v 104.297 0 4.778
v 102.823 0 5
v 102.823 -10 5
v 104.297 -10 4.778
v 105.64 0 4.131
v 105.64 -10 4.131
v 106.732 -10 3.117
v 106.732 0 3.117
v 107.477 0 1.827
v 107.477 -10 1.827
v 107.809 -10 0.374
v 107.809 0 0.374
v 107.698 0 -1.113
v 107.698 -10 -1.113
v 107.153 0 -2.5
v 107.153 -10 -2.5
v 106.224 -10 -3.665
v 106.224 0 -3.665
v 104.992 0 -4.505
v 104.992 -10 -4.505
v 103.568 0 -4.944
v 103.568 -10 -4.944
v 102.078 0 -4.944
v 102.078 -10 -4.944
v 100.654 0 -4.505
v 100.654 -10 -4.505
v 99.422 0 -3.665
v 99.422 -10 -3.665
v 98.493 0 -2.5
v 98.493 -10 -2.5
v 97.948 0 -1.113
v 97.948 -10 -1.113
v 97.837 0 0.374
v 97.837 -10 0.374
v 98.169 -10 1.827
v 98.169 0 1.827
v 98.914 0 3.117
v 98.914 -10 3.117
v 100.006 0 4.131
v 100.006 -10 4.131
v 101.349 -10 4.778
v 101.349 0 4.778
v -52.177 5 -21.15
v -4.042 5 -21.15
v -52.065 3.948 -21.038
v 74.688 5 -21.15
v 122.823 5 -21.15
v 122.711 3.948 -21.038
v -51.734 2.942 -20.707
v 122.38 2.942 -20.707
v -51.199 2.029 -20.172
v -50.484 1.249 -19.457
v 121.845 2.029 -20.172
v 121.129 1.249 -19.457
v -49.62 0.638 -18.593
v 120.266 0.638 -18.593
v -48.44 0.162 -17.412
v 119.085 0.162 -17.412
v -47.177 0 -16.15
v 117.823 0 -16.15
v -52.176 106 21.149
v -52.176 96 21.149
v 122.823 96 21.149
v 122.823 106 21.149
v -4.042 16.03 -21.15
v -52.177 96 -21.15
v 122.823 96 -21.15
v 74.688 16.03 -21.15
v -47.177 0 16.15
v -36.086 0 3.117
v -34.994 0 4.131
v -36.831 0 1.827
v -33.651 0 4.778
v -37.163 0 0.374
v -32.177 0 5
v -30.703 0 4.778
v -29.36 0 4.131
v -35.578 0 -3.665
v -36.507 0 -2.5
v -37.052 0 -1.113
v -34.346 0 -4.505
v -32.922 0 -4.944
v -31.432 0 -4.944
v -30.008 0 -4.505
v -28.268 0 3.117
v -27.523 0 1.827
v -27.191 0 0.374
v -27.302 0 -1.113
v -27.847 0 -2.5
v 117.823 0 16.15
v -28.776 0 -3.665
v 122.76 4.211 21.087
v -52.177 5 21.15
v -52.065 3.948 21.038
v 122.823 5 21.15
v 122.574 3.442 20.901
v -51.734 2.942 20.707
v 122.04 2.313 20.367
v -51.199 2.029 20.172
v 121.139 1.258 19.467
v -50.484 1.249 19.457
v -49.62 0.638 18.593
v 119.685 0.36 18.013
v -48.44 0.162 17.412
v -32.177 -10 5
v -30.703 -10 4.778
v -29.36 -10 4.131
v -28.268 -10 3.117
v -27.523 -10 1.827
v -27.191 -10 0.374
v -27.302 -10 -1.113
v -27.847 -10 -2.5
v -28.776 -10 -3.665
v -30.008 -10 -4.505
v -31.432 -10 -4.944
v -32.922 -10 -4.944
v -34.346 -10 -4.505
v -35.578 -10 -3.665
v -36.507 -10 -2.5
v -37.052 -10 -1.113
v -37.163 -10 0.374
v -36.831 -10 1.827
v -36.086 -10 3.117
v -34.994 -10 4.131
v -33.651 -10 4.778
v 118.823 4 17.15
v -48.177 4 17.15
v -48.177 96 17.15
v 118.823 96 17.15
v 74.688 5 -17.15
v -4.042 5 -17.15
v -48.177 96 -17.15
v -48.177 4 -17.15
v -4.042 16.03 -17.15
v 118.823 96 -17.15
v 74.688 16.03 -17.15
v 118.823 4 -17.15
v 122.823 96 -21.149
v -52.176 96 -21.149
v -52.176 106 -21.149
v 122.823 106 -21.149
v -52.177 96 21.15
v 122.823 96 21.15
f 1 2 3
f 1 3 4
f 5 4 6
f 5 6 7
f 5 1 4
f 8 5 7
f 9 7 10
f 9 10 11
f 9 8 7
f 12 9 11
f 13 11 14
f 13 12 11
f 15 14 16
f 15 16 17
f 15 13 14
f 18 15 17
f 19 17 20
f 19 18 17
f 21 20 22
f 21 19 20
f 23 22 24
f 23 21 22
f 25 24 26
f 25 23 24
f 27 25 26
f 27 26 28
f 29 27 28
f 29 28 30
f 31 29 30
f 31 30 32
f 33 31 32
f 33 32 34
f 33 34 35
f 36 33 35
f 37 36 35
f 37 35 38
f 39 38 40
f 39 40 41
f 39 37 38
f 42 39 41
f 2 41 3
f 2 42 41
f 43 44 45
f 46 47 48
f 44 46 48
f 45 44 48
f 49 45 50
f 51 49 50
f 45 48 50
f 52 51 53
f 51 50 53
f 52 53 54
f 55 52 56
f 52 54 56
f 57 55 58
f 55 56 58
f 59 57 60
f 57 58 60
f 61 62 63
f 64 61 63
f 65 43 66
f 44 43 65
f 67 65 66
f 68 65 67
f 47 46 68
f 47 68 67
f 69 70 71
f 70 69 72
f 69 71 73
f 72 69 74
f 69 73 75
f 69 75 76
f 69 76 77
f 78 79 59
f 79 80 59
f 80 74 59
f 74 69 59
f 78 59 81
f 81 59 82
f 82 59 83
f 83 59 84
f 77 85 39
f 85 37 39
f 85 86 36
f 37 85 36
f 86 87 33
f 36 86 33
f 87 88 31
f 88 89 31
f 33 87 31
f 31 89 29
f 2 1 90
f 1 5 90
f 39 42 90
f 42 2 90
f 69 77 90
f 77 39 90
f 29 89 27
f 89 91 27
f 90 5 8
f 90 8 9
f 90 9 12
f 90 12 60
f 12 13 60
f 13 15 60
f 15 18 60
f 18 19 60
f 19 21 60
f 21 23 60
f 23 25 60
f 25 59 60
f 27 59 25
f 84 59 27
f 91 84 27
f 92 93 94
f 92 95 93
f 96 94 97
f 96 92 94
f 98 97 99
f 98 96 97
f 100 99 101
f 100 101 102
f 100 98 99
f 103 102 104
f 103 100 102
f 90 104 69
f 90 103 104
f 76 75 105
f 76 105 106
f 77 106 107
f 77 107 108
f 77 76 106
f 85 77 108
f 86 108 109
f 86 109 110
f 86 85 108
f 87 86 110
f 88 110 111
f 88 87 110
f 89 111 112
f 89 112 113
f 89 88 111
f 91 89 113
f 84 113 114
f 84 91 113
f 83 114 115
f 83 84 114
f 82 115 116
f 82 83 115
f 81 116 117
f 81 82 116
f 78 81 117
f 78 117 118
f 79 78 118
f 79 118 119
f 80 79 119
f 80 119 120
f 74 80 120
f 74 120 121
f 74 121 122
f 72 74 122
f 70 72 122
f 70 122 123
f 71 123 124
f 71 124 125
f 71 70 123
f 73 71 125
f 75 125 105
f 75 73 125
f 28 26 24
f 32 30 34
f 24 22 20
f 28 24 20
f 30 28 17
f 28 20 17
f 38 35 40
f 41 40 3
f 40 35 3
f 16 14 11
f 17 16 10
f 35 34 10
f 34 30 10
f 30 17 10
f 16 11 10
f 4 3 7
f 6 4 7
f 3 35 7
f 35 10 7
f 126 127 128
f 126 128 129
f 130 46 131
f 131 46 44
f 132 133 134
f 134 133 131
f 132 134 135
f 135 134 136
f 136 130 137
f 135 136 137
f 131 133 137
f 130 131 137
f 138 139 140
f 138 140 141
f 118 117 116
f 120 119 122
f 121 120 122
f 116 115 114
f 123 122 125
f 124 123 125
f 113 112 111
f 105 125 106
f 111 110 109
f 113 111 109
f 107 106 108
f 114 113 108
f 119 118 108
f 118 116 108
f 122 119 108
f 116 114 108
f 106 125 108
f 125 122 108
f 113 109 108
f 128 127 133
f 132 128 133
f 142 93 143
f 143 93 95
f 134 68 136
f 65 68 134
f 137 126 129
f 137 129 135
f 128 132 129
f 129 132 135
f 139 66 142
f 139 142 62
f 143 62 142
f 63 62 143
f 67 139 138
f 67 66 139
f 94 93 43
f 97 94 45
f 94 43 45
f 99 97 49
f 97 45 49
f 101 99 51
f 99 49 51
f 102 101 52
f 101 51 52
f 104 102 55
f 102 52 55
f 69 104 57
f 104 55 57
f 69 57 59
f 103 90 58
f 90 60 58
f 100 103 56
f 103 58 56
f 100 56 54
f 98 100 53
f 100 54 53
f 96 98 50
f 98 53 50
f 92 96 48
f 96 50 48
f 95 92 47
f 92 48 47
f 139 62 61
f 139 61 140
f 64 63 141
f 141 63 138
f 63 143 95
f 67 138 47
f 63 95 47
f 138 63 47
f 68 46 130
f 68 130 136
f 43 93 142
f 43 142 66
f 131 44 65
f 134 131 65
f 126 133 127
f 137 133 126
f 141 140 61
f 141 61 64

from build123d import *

# Parameters (mm, degrees)
SKETCH1_W           = 175
SKETCH1_H           = 42.3
BOSS_EXTRUDE1_DEPTH = 4
SKETCH1_3_W         = 175
SKETCH1_3_H         = 42.3
SKETCH1_3_W_2       = 167
SKETCH1_3_H_2       = 34.3
BOSS_EXTRUDE2_DEPTH = 96
SKETCH1_4_R         = 5
BOSS_EXTRUDE3_DEPTH = 10
FILLET1_R           = 5
SKETCH3_W           = 78.73
SKETCH3_H           = 11.03
CUT_EXTRUDE1_DEPTH  = 4
SKETCH4_W           = 174.998654926
SKETCH4_H           = 42.297309852
BOSS_EXTRUDE4_DEPTH = 10


with BuildPart() as part:
    # Sketch1 → Boss-Extrude1 (new body)
    with BuildSketch(Plane(origin=(0, 0, 0), x_dir=(1, 0, 0), z_dir=(0, 1, 0))):
        with Locations((35.322931561, 0)):
            Rectangle(SKETCH1_W, SKETCH1_H)
    extrude(amount=BOSS_EXTRUDE1_DEPTH)

    # Sketch1<3> → Boss-Extrude2 (add)
    with BuildSketch(Plane(origin=(0, 0, 0), x_dir=(1, 0, 0), z_dir=(0, 1, 0))):
        with Locations((35.322931561, 0)):
            Rectangle(SKETCH1_3_W, SKETCH1_3_H)
        with Locations((35.322931561, 0)):
            Rectangle(SKETCH1_3_W_2, SKETCH1_3_H_2, mode=Mode.SUBTRACT)
    extrude(amount=BOSS_EXTRUDE2_DEPTH)

    # Sketch1<4> → Boss-Extrude3 (add)
    with BuildSketch(Plane(origin=(0, 0, 0), x_dir=(1, 0, 0), z_dir=(0, 1, 0))):
        with Locations((-32.177068439, 0)):
            Circle(SKETCH1_4_R)
        with Locations((102.822931561, 0)):
            Circle(SKETCH1_4_R)
    extrude(amount=-BOSS_EXTRUDE3_DEPTH)

    # Fillet1
    fillet1_edges = [part.edges().sort_by_distance(p)[0] for p in [
        (35.322931561, 0, 21.15),
        (-52.177068439, 0, 0),
        (35.322931561, 0, -21.15),
        (122.822931561, 0, 0),
    ]]
    fillet(fillet1_edges, radius=FILLET1_R)

    # Sketch3 → Cut-Extrude1 (cut)
    with BuildSketch(Plane(origin=(0, 0, -21.15), x_dir=(-1, 0, 0), z_dir=(0, 0, -1))):
        with Locations((-35.322931561, 10.515)):
            Rectangle(SKETCH3_W, SKETCH3_H)
    extrude(amount=-CUT_EXTRUDE1_DEPTH, mode=Mode.SUBTRACT)

    # Sketch4 → Boss-Extrude4 (add)
    with BuildSketch(Plane(origin=(0, 96, 0), x_dir=(1, 0, 0), z_dir=(0, 1, 0))):
        with Locations((35.323604098, 0)):
            Rectangle(SKETCH4_W, SKETCH4_H)
    extrude(amount=BOSS_EXTRUDE4_DEPTH)


solid = part.part
